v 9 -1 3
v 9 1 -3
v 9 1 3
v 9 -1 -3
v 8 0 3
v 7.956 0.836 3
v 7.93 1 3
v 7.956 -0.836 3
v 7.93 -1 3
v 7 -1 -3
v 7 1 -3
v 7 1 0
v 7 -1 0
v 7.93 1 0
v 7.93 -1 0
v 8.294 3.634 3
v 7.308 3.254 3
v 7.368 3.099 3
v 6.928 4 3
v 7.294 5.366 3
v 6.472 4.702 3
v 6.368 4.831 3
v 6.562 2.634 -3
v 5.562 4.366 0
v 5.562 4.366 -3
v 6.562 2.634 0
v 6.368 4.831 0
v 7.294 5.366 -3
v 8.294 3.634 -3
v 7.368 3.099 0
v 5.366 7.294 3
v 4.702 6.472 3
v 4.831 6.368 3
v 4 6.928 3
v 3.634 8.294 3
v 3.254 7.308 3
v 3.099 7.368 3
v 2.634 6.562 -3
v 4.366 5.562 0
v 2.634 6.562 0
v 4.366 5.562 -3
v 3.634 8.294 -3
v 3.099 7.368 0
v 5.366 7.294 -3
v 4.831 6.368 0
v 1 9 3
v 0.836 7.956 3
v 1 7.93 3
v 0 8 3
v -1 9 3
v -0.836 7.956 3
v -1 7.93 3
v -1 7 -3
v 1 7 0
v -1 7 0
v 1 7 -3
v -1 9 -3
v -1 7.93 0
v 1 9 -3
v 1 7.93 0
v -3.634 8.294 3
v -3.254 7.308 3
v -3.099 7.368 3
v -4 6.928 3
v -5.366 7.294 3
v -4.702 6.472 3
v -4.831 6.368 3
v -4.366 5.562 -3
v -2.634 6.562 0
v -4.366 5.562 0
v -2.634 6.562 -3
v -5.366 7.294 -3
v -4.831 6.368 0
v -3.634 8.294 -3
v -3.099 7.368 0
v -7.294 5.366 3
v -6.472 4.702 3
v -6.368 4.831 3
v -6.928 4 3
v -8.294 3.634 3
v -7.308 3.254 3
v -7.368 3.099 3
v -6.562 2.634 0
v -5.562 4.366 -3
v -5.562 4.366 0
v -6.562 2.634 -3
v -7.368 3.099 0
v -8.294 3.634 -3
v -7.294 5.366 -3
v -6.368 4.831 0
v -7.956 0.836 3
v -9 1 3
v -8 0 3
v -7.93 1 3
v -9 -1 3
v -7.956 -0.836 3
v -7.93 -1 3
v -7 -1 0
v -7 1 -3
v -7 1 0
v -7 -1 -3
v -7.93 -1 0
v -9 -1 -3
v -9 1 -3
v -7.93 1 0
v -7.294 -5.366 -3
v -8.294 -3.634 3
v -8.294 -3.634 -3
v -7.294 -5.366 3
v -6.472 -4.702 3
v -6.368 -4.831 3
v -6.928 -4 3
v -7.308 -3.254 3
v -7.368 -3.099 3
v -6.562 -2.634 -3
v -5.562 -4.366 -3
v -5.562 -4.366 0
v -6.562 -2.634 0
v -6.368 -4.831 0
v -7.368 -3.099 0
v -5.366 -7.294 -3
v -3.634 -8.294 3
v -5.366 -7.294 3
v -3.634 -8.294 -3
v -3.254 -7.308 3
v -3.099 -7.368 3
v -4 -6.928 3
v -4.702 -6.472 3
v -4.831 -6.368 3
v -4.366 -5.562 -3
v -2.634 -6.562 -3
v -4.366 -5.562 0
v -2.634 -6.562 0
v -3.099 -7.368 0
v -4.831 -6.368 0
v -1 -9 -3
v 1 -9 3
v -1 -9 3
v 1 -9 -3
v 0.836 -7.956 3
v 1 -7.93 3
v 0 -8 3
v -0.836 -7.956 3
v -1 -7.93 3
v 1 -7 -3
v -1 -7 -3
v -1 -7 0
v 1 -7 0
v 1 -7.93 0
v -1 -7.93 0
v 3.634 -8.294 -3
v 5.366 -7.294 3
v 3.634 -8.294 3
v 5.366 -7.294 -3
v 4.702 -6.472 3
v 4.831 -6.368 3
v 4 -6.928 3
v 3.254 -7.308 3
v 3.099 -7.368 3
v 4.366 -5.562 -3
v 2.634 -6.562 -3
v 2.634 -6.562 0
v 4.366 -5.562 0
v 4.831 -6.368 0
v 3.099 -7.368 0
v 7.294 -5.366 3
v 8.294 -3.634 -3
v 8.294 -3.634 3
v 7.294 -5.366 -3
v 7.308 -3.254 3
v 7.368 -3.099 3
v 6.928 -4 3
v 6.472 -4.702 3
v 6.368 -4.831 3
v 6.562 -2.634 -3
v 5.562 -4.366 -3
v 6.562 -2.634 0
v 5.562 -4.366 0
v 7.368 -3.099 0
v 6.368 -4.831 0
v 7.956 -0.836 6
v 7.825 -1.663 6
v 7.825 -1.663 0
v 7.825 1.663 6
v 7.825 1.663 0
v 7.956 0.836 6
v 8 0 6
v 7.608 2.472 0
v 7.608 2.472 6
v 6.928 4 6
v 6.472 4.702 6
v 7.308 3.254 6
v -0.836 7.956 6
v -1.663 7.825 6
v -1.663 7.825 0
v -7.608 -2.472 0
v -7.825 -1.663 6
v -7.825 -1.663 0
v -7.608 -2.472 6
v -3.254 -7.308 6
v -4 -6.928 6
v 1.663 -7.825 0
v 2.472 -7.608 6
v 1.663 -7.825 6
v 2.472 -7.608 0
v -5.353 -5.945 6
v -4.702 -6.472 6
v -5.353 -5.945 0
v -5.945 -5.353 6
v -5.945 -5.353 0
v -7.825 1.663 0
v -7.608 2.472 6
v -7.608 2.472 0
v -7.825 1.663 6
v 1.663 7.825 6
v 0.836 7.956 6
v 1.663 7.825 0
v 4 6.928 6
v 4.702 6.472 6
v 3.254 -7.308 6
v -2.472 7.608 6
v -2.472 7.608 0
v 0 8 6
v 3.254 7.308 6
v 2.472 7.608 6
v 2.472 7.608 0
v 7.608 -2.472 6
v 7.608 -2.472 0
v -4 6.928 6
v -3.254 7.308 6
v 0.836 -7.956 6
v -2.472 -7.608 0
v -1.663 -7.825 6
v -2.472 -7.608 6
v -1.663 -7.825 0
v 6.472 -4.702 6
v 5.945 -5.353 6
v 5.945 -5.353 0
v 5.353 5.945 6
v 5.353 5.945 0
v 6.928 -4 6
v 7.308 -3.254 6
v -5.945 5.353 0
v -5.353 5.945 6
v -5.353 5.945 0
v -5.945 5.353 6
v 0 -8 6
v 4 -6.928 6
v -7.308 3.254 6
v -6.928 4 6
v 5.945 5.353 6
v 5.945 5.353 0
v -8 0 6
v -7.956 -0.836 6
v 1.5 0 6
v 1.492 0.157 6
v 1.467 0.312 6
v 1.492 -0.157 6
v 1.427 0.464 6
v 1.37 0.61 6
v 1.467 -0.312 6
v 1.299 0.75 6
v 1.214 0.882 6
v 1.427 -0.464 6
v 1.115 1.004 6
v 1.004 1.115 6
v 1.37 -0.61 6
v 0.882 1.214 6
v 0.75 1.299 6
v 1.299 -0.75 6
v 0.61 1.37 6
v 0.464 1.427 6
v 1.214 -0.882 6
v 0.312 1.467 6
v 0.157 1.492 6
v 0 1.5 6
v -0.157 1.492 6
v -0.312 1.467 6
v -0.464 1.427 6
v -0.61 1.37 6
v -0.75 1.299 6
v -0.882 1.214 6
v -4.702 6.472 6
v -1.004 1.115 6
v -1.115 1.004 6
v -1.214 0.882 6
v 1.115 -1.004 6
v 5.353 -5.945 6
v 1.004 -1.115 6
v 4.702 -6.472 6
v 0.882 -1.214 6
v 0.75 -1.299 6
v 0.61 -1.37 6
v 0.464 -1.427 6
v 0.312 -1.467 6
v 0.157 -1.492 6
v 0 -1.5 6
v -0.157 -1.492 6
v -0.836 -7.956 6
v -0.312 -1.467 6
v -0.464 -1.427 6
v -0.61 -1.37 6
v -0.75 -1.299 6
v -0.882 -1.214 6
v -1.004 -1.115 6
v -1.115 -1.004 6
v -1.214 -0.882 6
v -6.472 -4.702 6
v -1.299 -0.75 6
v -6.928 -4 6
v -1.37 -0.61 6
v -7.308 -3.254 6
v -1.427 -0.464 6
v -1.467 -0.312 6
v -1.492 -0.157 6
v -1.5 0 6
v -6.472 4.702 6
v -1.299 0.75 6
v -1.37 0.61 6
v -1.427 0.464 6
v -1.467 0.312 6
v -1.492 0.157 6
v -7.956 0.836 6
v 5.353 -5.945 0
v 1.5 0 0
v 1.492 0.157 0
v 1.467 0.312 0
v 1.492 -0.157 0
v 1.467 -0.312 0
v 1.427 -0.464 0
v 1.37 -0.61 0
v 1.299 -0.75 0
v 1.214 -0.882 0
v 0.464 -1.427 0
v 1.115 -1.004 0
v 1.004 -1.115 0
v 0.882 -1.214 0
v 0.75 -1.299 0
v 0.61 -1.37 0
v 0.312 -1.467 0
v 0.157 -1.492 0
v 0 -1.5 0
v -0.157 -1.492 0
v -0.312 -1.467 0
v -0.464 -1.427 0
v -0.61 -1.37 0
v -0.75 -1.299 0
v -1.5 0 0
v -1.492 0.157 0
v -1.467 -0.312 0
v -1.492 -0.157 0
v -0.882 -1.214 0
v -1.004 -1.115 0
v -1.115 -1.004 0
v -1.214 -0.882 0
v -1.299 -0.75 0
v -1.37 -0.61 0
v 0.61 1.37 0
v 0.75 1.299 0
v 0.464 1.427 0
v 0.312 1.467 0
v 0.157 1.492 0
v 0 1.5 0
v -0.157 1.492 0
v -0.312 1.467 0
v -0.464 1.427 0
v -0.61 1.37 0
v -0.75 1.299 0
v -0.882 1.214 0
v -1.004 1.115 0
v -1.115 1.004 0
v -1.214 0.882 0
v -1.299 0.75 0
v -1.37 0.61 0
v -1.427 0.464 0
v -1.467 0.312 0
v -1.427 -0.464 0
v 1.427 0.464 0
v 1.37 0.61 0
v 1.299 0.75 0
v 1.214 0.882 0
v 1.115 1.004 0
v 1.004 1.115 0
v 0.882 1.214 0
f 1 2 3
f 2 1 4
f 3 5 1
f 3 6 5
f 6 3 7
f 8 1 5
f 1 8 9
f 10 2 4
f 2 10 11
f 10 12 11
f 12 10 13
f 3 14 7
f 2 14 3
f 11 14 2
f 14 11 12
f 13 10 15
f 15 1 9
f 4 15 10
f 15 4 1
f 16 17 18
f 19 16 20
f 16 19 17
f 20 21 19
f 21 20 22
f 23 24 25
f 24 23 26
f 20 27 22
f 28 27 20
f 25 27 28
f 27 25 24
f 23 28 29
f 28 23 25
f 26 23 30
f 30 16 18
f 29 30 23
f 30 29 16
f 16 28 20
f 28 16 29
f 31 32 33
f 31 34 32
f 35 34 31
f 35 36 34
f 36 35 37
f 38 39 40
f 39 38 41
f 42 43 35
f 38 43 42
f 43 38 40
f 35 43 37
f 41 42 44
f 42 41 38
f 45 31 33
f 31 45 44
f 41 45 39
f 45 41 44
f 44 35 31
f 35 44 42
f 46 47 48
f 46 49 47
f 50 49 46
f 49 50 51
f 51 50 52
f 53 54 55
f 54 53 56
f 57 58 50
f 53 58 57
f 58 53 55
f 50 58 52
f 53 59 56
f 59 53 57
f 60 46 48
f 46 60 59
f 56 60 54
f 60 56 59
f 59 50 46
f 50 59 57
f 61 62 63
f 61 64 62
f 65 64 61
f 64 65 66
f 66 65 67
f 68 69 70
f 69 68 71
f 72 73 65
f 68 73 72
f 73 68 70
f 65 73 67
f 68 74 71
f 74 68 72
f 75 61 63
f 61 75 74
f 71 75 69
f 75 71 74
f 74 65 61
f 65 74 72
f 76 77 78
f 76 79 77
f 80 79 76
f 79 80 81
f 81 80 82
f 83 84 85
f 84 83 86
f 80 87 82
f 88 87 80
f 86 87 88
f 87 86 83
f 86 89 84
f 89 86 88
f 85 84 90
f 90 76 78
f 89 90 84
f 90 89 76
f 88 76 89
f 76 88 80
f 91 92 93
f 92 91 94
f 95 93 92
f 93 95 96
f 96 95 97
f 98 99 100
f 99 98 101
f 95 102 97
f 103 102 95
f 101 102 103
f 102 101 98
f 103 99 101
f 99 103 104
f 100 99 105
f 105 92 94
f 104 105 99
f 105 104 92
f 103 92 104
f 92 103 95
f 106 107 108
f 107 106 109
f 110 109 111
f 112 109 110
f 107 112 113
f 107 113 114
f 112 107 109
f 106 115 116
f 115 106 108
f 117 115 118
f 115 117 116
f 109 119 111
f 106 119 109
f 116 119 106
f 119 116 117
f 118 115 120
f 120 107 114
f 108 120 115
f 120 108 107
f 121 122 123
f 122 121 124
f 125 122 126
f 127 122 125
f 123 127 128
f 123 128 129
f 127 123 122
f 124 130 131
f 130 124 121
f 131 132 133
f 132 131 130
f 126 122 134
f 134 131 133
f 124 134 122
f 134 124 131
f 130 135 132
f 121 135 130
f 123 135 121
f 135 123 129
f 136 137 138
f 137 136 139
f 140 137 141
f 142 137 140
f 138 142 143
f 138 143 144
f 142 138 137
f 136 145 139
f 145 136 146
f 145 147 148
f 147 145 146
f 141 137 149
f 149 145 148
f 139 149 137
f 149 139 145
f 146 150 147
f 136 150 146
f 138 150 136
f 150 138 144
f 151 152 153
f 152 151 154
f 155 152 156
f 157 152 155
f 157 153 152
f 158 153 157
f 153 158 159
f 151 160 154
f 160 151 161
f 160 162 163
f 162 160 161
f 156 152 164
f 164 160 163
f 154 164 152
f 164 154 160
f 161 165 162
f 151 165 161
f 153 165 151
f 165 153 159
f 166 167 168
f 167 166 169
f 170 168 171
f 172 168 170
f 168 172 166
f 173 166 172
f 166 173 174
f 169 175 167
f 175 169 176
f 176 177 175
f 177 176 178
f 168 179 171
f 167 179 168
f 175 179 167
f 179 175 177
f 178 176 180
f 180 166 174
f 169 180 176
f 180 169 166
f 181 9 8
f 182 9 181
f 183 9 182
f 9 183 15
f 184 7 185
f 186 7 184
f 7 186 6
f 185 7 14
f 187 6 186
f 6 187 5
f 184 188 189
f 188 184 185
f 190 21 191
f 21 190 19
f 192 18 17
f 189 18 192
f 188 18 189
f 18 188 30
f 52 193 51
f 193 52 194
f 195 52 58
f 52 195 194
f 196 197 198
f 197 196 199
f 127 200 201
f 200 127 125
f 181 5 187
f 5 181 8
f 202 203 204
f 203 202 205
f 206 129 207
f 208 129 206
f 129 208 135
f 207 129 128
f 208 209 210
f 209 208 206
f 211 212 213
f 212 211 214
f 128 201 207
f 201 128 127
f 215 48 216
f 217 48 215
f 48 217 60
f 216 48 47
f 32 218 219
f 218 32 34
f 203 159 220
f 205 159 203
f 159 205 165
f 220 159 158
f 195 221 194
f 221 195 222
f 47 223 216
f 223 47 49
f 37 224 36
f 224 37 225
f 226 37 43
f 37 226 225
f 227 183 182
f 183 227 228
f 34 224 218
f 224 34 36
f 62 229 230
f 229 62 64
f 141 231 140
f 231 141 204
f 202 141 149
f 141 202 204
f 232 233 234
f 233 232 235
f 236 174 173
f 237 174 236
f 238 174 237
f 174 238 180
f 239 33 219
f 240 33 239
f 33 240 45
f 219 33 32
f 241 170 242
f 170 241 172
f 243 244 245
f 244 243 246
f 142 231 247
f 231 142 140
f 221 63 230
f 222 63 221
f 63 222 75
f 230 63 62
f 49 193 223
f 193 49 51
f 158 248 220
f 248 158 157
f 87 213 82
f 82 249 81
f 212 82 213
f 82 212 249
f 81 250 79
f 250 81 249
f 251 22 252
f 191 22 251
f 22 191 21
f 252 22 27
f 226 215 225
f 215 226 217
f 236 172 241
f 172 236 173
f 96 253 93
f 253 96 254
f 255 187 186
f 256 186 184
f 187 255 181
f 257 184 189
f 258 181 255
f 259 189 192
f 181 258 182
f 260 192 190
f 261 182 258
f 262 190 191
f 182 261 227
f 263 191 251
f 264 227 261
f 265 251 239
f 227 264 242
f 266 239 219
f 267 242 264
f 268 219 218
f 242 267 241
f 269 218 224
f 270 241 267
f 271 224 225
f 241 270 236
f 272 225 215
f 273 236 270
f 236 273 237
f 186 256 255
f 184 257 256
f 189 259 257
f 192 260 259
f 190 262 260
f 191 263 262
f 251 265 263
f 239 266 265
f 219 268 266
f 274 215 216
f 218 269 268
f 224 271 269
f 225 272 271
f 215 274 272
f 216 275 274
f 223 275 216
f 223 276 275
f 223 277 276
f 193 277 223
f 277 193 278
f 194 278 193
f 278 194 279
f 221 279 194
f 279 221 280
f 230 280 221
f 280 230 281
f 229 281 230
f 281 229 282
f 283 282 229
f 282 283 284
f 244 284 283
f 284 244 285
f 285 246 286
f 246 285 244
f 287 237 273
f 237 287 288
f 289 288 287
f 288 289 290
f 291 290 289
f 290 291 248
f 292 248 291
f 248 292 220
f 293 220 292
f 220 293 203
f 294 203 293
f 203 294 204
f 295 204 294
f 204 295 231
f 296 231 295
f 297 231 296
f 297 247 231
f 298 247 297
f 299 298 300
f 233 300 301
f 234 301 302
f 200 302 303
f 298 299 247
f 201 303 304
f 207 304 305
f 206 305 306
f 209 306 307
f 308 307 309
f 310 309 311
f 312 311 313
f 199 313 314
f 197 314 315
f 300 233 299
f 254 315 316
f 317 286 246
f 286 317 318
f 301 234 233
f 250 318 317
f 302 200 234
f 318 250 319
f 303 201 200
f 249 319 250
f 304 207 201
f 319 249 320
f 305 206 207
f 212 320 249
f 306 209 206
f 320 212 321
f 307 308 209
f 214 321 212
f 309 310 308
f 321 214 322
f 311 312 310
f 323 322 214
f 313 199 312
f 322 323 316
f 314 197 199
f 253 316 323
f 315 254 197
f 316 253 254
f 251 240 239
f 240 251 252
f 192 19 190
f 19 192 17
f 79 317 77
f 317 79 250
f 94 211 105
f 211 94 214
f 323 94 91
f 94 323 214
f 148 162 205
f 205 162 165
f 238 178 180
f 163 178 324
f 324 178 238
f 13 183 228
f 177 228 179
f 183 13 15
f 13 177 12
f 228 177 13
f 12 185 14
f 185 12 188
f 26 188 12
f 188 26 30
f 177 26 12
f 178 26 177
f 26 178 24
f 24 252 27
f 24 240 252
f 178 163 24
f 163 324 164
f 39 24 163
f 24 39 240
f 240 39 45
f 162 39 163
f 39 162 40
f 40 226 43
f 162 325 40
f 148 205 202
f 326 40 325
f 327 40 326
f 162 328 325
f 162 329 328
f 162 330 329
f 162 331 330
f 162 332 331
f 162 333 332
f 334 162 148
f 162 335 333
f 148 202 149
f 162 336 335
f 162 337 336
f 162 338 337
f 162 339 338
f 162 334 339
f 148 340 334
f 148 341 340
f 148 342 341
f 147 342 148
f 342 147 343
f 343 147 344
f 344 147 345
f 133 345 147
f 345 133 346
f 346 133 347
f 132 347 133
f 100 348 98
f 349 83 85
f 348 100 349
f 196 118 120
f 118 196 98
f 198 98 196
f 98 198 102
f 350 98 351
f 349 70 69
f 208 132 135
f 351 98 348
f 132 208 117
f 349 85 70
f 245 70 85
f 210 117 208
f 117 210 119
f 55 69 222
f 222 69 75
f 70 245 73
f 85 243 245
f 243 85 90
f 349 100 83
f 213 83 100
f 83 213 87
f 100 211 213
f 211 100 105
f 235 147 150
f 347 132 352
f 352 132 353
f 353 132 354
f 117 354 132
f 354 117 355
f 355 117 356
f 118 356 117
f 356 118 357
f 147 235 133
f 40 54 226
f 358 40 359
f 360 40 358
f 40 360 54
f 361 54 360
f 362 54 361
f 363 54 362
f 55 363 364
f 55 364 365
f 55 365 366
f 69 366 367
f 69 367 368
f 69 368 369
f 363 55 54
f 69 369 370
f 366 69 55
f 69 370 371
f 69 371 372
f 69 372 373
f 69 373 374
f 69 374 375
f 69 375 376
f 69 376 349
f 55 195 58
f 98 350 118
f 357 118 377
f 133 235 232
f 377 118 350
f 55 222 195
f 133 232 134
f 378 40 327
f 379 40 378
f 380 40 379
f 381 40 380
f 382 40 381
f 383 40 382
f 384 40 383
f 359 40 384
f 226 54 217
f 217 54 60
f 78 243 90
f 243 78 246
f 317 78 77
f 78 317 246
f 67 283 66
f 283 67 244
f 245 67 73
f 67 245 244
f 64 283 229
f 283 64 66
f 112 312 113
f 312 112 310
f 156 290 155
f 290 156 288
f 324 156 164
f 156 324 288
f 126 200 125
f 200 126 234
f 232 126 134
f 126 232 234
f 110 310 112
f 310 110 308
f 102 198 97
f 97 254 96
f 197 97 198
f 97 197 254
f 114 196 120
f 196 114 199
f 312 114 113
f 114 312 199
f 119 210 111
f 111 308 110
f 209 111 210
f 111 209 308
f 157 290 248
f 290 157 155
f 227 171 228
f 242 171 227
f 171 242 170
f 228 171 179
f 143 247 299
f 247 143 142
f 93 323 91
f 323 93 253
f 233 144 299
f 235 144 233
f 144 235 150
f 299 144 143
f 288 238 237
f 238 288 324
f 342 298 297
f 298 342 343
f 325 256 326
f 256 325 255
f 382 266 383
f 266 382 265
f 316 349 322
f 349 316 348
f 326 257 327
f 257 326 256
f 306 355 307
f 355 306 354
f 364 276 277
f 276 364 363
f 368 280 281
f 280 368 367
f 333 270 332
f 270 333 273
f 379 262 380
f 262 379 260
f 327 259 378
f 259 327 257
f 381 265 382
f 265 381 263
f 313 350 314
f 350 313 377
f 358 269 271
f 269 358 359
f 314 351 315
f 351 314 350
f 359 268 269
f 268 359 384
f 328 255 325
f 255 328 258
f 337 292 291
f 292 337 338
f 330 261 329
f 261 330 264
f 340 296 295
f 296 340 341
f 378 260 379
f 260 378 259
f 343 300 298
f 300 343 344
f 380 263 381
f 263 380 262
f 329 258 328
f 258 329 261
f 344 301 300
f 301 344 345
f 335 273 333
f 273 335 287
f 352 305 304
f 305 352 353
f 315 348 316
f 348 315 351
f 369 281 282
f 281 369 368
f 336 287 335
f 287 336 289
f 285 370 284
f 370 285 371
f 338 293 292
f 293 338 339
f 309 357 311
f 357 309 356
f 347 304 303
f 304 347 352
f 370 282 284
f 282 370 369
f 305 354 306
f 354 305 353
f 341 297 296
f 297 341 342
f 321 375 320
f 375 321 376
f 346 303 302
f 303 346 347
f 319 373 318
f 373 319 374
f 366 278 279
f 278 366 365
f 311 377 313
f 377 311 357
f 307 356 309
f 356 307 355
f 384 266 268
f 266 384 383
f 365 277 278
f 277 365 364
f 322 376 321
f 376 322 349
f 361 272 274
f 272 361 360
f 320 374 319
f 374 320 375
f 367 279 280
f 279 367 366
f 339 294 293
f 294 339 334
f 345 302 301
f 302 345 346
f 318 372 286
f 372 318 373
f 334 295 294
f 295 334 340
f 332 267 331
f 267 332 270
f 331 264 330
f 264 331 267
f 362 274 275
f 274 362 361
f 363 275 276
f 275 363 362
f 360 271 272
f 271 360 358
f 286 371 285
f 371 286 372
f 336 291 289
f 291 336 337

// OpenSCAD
// Gear blank with external locator teeth.
$fn = 60;
eps = 0.02;
bore_d = 3;
root_d = 16;
teeth = 12;
thickness = 6;
difference() { union() { cylinder(d=root_d,h=thickness); for(i=[0:teeth-1]) rotate([0,0,i*360/teeth]) translate([root_d/2,0,0]) cube([2,max(2,root_d*0.08),thickness],center=true); } translate([0,0,-eps]) cylinder(d=bore_d,h=thickness+2*eps); }
